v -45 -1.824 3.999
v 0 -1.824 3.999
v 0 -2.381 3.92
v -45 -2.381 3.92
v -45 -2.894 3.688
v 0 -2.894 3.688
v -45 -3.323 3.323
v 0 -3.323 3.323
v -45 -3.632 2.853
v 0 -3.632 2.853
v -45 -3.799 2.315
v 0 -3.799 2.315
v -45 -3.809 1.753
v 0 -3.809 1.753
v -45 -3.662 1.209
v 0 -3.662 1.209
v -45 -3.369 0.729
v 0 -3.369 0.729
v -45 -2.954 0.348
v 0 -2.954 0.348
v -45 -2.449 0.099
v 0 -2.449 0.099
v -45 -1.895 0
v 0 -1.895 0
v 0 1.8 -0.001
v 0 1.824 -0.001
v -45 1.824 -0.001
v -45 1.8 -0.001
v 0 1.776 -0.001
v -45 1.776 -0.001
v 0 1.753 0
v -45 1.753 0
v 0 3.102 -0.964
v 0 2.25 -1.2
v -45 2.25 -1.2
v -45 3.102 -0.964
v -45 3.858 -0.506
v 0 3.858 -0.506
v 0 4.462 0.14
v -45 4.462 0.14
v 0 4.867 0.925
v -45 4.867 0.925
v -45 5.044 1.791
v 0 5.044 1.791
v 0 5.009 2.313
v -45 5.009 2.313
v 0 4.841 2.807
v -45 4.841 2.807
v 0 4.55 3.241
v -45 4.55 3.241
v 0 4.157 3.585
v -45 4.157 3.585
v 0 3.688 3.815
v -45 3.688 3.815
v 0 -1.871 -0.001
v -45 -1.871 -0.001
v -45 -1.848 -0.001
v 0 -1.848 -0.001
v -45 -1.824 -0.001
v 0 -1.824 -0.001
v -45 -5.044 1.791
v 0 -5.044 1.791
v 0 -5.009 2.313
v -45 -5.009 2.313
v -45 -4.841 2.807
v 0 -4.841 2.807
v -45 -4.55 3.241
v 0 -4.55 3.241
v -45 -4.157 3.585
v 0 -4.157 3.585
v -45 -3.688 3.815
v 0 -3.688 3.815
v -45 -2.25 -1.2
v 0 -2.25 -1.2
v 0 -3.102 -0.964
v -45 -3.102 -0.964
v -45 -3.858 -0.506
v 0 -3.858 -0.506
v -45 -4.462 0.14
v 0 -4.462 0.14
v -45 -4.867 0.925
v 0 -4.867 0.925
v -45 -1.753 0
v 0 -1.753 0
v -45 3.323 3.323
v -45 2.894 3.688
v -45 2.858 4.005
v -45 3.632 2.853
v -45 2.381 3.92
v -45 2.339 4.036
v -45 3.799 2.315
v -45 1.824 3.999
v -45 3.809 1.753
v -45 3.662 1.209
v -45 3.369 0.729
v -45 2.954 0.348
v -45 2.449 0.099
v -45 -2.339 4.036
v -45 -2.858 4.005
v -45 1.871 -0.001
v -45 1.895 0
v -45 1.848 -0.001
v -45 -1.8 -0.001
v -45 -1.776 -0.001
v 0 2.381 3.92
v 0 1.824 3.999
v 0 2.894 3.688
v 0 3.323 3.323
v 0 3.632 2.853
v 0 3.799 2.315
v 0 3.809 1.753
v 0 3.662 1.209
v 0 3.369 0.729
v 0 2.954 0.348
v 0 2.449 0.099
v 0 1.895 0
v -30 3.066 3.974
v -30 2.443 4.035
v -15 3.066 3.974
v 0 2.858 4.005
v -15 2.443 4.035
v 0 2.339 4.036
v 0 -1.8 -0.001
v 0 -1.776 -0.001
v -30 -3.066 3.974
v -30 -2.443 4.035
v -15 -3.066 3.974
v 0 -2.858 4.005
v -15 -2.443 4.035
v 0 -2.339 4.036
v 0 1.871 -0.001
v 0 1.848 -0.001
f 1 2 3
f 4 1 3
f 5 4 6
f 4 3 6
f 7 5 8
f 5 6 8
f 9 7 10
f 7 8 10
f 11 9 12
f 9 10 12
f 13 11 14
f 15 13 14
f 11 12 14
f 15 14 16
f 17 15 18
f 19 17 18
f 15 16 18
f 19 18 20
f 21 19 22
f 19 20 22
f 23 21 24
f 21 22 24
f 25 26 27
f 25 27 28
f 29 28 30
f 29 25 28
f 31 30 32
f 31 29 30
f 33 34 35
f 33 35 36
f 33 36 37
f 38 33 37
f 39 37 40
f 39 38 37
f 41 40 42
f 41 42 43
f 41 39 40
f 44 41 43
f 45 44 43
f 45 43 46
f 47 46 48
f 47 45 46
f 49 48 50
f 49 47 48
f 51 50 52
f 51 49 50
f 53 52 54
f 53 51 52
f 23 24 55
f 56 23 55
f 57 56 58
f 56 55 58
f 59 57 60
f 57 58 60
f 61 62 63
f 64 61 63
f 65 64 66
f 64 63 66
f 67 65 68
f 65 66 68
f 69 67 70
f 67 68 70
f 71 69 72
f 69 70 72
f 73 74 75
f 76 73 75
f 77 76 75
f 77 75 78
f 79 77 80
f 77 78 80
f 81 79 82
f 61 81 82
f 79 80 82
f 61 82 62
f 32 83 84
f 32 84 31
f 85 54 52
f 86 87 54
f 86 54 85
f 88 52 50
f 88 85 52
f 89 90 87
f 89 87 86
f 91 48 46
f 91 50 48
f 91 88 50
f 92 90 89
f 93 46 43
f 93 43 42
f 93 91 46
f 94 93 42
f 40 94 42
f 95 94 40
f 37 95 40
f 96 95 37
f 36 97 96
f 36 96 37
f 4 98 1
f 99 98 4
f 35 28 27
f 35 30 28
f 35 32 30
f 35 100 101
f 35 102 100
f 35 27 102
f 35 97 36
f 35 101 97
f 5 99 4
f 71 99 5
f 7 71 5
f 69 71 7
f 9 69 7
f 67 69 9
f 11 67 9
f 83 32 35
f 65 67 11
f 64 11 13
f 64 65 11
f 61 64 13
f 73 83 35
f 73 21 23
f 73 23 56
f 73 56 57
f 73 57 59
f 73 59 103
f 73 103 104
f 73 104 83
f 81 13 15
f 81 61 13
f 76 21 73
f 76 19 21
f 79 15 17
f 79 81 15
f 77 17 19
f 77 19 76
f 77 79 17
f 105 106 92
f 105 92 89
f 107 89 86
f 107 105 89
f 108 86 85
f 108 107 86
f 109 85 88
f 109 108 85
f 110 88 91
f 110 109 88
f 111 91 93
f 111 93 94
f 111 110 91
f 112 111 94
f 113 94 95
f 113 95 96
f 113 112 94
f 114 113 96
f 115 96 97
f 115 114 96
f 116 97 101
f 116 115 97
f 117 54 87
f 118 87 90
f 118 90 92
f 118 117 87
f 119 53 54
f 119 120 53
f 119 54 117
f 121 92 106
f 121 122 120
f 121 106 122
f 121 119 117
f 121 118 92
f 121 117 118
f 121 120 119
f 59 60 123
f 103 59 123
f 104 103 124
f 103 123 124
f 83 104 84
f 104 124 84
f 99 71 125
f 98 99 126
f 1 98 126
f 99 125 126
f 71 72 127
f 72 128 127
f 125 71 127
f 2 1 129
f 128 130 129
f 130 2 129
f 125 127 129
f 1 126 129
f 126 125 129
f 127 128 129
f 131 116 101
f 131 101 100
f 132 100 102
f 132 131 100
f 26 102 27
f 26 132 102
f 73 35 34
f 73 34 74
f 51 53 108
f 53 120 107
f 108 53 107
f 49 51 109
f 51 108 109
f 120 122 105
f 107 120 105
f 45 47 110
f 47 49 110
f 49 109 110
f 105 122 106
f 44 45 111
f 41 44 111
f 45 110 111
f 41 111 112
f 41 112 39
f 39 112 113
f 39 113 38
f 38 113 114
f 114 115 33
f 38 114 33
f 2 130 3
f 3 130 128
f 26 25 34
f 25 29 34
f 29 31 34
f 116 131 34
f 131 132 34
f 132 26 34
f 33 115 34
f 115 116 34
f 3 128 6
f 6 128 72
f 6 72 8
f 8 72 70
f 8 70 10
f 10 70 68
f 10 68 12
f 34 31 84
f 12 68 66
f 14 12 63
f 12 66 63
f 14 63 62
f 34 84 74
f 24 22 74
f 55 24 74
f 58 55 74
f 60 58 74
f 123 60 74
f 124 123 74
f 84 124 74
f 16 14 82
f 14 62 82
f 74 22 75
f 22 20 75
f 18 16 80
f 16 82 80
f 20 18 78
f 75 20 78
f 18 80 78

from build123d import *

# Parameters (mm, degrees)
BOSS_EXTRUDE1_DEPTH = 45


with BuildPart() as part:
    # Sketch1 → Boss-Extrude1 (new body)
    with BuildSketch(Plane(origin=(0, 0, 0), x_dir=(0, 0, -1), z_dir=(1, 0, 0))):
        with BuildLine():
            Line((0, 1.752794941), (0, 0))
            Line((0, 0), (1.2, 0))
            Line((1.2, 0), (1.2, 2.25))
            ThreePointArc((1.2, 2.25), (0.204042598, 4.182148799), (-1.79143145, 5.044247083))
            ThreePointArc((-1.79143145, 5.044247083), (-3.03361172, 4.709604832), (-3.814999682, 3.687631197))
            add(Edge.make_bspline(
                [(-3.814999682, 3.687631197), (-4.023588676, 3.069262046), (-4.083460081, 2.438222998), (-3.998734694, 1.823925967)],
                knots=[0.27184632, 0.27184632, 0.27184632, 0.27184632, 0.735422056, 0.735422056, 0.735422056, 0.735422056], degree=3))
            ThreePointArc((-3.998734694, 1.823925967), (-2.034305834, 3.823609616), (0, 1.895056993))
            ThreePointArc((0, 1.895056993), (0.000948954, 1.859497107), (0.001265306, 1.823925967))
            ThreePointArc((0.001265306, 1.823925967), (0.000948954, 1.788354828), (0, 1.752794941))
        make_face()
    extrude(amount=-BOSS_EXTRUDE1_DEPTH)

    # Mirror1: part across plane


with BuildPart() as part_1:
    add(part.part)
    add(part.part.mirror(Plane(origin=(-45, 0, 0), x_dir=(0, 0, 1), z_dir=(0, -1, 0))))


solid = part_1.part
